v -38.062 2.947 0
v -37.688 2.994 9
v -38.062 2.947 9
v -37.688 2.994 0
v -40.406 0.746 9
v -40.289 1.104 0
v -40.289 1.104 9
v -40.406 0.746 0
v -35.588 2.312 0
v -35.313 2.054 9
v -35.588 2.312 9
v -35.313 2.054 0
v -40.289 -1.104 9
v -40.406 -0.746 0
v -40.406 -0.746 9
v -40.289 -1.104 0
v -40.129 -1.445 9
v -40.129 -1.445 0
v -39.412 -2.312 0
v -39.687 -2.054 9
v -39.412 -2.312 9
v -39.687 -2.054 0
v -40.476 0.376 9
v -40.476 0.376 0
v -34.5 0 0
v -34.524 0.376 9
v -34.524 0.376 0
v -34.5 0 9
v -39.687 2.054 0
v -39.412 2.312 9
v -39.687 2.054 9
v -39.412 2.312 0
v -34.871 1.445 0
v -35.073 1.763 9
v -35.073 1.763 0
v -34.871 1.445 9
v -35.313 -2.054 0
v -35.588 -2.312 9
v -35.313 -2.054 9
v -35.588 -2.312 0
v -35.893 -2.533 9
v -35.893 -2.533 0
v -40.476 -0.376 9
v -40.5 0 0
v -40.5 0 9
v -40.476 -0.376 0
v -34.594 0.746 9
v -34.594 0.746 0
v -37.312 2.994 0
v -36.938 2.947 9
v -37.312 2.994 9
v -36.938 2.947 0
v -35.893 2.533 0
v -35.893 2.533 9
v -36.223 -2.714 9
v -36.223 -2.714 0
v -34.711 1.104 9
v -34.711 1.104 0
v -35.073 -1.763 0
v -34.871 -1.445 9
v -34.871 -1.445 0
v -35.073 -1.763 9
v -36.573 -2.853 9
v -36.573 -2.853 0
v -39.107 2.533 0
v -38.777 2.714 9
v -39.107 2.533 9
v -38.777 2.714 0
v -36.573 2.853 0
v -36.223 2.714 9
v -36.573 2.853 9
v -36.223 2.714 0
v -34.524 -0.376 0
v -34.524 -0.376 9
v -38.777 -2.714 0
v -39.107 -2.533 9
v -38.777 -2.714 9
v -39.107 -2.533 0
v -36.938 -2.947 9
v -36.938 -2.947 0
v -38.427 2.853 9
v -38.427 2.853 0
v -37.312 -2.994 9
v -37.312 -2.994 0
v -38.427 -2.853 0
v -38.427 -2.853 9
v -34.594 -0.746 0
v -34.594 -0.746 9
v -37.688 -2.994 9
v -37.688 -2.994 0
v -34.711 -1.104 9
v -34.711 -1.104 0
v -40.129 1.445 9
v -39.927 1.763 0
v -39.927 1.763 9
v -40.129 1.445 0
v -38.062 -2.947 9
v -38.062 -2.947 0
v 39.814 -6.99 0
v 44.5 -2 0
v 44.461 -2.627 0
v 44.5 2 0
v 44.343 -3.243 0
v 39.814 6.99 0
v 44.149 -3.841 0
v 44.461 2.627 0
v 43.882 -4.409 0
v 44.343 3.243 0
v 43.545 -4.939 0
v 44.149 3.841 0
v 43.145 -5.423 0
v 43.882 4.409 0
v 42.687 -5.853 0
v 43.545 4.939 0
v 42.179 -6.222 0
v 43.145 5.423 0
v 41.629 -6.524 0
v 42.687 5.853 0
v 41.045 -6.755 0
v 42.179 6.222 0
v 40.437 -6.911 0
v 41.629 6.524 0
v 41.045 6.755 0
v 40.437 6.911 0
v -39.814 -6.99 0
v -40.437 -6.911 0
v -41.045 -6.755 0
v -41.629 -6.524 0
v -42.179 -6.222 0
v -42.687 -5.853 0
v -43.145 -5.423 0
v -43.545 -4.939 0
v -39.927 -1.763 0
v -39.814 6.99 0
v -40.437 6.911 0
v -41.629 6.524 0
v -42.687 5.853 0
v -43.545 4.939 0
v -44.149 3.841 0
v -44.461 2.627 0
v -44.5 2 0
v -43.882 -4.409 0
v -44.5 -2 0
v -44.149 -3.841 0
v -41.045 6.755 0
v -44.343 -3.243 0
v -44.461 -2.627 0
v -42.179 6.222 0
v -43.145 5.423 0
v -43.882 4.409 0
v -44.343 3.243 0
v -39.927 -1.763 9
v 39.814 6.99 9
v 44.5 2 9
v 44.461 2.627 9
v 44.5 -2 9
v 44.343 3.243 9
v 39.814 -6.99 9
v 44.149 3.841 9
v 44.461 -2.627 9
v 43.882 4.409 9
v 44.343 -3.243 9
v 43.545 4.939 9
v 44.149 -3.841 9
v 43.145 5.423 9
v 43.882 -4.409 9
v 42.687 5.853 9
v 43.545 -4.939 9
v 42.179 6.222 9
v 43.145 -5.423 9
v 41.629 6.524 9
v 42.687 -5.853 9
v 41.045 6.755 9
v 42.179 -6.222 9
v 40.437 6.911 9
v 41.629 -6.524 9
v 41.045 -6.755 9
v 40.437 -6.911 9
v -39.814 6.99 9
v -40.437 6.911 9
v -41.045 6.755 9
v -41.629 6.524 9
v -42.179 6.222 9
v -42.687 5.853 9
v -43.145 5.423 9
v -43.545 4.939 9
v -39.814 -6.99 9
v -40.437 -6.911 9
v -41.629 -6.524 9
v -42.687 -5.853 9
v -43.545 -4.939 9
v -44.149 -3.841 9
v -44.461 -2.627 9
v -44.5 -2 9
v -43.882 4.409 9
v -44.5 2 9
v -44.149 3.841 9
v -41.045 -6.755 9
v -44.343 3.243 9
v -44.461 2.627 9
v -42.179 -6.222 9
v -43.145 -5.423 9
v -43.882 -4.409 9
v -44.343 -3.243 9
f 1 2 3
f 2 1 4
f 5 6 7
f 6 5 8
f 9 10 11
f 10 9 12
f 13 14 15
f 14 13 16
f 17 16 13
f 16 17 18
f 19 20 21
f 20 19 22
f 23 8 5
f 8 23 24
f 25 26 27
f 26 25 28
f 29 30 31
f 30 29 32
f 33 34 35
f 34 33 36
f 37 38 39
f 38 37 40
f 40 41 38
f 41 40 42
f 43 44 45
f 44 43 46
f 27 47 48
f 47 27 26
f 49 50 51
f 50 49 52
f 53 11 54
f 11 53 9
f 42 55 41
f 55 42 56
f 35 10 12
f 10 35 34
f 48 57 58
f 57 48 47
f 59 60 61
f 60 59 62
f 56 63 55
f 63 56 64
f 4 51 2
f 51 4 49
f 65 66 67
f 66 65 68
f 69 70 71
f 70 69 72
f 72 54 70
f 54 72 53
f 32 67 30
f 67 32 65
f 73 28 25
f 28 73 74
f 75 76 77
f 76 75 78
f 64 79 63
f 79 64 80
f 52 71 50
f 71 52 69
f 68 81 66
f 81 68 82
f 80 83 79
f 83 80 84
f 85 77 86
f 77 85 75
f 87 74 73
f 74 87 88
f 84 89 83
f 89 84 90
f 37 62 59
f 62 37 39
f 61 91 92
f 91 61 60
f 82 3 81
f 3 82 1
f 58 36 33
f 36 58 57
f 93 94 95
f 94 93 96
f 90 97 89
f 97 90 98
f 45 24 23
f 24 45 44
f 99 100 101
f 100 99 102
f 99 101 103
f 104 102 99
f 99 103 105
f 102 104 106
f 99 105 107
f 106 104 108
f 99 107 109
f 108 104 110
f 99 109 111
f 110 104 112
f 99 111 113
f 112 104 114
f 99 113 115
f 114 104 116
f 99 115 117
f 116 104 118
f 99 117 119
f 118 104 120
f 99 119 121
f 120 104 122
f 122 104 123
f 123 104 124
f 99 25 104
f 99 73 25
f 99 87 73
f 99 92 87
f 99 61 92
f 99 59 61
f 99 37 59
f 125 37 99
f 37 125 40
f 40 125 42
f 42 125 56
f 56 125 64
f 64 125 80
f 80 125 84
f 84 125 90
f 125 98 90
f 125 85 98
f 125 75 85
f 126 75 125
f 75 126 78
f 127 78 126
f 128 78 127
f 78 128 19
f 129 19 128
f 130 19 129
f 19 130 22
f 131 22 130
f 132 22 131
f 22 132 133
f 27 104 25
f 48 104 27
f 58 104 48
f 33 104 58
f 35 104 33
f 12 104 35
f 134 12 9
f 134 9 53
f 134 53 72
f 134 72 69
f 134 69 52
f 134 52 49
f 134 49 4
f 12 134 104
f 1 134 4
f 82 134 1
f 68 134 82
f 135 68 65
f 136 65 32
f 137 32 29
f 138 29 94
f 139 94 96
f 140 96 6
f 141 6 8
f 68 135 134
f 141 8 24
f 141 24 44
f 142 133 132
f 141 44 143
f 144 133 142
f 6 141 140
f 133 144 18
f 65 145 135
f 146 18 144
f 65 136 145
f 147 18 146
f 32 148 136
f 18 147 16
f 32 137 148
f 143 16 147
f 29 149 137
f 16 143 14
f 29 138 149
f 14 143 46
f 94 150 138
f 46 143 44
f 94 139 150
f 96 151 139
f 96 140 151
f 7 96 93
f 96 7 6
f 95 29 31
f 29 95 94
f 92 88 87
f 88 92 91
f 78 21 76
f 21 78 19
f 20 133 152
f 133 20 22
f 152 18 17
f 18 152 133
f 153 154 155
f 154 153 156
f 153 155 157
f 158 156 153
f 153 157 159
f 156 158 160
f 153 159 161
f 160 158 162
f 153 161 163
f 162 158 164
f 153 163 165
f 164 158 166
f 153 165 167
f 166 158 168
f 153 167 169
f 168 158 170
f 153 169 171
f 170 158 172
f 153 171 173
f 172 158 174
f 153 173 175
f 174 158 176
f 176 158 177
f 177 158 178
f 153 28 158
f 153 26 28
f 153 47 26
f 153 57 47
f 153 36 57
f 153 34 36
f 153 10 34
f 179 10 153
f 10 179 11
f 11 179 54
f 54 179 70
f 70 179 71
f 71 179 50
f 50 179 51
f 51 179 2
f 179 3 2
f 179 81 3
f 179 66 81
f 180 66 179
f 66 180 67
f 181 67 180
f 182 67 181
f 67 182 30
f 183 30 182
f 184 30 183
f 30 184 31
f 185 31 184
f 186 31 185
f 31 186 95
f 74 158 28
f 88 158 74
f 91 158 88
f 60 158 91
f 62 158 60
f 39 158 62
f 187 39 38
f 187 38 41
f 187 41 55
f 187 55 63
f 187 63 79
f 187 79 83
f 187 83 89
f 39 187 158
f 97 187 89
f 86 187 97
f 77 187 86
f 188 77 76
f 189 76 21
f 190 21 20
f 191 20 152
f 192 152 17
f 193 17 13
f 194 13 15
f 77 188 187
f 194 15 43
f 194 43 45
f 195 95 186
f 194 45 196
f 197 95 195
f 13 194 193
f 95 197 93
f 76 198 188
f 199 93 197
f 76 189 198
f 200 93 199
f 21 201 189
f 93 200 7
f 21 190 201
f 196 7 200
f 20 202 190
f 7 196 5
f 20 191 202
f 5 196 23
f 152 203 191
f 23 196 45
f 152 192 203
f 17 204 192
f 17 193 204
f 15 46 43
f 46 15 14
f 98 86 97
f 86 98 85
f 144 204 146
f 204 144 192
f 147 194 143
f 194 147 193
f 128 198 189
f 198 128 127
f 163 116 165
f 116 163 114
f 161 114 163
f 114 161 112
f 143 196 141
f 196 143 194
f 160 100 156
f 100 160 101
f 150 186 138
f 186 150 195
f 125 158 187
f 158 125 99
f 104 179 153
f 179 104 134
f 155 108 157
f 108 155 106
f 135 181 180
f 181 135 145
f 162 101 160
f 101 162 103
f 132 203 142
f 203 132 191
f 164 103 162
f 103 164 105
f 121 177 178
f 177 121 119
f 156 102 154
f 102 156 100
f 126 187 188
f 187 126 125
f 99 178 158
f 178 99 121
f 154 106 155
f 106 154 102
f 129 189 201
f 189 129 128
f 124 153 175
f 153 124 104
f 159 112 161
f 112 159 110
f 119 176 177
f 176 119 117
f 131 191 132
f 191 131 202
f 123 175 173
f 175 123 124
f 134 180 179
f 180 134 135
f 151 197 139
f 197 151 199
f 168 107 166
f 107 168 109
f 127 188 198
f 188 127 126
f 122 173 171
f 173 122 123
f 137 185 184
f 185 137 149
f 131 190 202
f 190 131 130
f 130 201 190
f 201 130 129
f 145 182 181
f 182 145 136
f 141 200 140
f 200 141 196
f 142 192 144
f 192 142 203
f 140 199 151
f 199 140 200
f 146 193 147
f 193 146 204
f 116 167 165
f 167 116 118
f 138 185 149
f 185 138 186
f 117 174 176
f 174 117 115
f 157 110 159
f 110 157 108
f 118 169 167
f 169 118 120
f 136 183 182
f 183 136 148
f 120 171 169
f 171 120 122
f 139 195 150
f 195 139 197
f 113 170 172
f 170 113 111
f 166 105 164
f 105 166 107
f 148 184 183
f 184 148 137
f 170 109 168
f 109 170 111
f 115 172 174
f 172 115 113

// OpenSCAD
$fn = 50;


difference() {
	union() {
		hull() {
			translate(v = [-39.5000000000, 2.0000000000, 0]) {
				cylinder(h = 9, r = 5);
			}
			translate(v = [39.5000000000, 2.0000000000, 0]) {
				cylinder(h = 9, r = 5);
			}
			translate(v = [-39.5000000000, -2.0000000000, 0]) {
				cylinder(h = 9, r = 5);
			}
			translate(v = [39.5000000000, -2.0000000000, 0]) {
				cylinder(h = 9, r = 5);
			}
		}
	}
	union() {
		translate(v = [-37.5000000000, 0.0000000000, 0]) {
			cylinder(h = 9, r = 3.0000000000);
		}
		translate(v = [-37.5000000000, 0.0000000000, 0]) {
			cylinder(h = 9, r = 1.5000000000);
		}
		translate(v = [-37.5000000000, 0.0000000000, 0]) {
			cylinder(h = 9, r = 1.5000000000);
		}
		translate(v = [-37.5000000000, 0.0000000000, 0]) {
			cylinder(h = 9, r = 1.5000000000);
		}
	}
}
